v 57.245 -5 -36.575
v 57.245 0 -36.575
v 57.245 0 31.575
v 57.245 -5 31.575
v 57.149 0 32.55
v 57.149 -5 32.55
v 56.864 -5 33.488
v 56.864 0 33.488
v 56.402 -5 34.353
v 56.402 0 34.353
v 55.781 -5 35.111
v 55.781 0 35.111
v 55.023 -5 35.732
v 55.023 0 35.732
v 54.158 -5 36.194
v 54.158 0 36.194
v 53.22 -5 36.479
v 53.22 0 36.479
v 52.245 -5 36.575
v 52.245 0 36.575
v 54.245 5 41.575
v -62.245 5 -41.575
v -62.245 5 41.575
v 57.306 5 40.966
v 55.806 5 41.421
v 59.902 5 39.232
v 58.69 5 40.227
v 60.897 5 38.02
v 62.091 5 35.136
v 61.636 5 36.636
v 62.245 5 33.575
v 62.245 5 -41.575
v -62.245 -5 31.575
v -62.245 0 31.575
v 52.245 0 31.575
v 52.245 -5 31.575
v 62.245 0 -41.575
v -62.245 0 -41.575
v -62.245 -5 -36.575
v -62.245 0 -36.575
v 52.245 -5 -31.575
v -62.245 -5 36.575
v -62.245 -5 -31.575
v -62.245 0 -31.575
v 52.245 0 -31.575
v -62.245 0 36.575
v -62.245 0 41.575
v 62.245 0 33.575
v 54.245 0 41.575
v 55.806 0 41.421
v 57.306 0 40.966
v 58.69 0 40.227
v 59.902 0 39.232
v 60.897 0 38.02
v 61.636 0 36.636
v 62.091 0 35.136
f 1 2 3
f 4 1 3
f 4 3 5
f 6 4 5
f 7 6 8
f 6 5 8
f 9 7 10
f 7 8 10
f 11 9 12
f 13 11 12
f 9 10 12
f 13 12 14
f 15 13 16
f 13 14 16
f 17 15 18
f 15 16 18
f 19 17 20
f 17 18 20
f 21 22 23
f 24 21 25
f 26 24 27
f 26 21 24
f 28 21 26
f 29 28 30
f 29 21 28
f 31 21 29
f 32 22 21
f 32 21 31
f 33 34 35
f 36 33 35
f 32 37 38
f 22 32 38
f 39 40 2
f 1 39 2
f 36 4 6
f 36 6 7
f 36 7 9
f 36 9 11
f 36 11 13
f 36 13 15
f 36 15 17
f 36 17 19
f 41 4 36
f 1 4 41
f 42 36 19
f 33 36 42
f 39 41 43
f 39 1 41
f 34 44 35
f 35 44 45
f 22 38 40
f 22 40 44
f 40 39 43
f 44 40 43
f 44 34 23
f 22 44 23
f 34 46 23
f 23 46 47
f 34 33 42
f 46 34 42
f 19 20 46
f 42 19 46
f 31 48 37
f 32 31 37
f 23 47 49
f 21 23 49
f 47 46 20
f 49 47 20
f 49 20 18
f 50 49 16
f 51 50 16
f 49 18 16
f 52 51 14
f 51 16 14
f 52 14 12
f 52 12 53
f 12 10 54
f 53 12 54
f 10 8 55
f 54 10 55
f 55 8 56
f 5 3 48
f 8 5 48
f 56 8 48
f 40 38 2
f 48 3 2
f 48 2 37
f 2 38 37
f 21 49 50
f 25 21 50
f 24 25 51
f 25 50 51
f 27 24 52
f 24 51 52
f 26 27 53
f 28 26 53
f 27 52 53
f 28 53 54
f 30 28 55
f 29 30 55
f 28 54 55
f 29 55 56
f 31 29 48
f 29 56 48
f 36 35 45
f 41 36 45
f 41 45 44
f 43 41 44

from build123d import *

# Parameters (mm, degrees)
SALIENTE_EXTRUIR1_DEPTH = 5
SALIENTE_EXTRUIR2_DEPTH = 5


with BuildPart() as part:
    # Croquis1 → Saliente-Extruir1 (new body)
    with BuildSketch(Plane(origin=(0, 0, 0), x_dir=(1, 0, 0), z_dir=(0, 1, 0))):
        with BuildLine():
            Line((-62.245, -41.575), (54.245, -41.575))
            ThreePointArc((54.245, -41.575), (59.901854249, -39.231854249), (62.245, -33.575))
            Line((62.245, -33.575), (62.245, 41.575))
            Line((62.245, 41.575), (-62.245, 41.575))
            Line((-62.245, 41.575), (-62.245, -41.575))
        make_face()
    extrude(amount=SALIENTE_EXTRUIR1_DEPTH)

    # Croquis2 → Saliente-Extruir2 (add)
    with BuildSketch(Plane(origin=(0, 0, 0), x_dir=(1, 0, 0), z_dir=(0, 1, 0))):
        with BuildLine():
            Line((52.245, -31.575), (52.245, 31.575))
            Line((52.245, 31.575), (21.4, 31.575))
            Line((21.4, 31.575), (-62.245, 31.575))
            Line((-62.245, 31.575), (-62.245, 36.575))
            Line((-62.245, 36.575), (57.245, 36.575))
            Line((57.245, 36.575), (57.245, -31.575))
            ThreePointArc((57.245, -31.575), (55.780533906, -35.110533906), (52.245, -36.575))
            Line((52.245, -36.575), (-62.245, -36.575))
            Line((-62.245, -36.575), (-62.245, -31.575))
            Line((-62.245, -31.575), (52.245, -31.575))
        make_face()
    extrude(amount=-SALIENTE_EXTRUIR2_DEPTH)


solid = part.part
